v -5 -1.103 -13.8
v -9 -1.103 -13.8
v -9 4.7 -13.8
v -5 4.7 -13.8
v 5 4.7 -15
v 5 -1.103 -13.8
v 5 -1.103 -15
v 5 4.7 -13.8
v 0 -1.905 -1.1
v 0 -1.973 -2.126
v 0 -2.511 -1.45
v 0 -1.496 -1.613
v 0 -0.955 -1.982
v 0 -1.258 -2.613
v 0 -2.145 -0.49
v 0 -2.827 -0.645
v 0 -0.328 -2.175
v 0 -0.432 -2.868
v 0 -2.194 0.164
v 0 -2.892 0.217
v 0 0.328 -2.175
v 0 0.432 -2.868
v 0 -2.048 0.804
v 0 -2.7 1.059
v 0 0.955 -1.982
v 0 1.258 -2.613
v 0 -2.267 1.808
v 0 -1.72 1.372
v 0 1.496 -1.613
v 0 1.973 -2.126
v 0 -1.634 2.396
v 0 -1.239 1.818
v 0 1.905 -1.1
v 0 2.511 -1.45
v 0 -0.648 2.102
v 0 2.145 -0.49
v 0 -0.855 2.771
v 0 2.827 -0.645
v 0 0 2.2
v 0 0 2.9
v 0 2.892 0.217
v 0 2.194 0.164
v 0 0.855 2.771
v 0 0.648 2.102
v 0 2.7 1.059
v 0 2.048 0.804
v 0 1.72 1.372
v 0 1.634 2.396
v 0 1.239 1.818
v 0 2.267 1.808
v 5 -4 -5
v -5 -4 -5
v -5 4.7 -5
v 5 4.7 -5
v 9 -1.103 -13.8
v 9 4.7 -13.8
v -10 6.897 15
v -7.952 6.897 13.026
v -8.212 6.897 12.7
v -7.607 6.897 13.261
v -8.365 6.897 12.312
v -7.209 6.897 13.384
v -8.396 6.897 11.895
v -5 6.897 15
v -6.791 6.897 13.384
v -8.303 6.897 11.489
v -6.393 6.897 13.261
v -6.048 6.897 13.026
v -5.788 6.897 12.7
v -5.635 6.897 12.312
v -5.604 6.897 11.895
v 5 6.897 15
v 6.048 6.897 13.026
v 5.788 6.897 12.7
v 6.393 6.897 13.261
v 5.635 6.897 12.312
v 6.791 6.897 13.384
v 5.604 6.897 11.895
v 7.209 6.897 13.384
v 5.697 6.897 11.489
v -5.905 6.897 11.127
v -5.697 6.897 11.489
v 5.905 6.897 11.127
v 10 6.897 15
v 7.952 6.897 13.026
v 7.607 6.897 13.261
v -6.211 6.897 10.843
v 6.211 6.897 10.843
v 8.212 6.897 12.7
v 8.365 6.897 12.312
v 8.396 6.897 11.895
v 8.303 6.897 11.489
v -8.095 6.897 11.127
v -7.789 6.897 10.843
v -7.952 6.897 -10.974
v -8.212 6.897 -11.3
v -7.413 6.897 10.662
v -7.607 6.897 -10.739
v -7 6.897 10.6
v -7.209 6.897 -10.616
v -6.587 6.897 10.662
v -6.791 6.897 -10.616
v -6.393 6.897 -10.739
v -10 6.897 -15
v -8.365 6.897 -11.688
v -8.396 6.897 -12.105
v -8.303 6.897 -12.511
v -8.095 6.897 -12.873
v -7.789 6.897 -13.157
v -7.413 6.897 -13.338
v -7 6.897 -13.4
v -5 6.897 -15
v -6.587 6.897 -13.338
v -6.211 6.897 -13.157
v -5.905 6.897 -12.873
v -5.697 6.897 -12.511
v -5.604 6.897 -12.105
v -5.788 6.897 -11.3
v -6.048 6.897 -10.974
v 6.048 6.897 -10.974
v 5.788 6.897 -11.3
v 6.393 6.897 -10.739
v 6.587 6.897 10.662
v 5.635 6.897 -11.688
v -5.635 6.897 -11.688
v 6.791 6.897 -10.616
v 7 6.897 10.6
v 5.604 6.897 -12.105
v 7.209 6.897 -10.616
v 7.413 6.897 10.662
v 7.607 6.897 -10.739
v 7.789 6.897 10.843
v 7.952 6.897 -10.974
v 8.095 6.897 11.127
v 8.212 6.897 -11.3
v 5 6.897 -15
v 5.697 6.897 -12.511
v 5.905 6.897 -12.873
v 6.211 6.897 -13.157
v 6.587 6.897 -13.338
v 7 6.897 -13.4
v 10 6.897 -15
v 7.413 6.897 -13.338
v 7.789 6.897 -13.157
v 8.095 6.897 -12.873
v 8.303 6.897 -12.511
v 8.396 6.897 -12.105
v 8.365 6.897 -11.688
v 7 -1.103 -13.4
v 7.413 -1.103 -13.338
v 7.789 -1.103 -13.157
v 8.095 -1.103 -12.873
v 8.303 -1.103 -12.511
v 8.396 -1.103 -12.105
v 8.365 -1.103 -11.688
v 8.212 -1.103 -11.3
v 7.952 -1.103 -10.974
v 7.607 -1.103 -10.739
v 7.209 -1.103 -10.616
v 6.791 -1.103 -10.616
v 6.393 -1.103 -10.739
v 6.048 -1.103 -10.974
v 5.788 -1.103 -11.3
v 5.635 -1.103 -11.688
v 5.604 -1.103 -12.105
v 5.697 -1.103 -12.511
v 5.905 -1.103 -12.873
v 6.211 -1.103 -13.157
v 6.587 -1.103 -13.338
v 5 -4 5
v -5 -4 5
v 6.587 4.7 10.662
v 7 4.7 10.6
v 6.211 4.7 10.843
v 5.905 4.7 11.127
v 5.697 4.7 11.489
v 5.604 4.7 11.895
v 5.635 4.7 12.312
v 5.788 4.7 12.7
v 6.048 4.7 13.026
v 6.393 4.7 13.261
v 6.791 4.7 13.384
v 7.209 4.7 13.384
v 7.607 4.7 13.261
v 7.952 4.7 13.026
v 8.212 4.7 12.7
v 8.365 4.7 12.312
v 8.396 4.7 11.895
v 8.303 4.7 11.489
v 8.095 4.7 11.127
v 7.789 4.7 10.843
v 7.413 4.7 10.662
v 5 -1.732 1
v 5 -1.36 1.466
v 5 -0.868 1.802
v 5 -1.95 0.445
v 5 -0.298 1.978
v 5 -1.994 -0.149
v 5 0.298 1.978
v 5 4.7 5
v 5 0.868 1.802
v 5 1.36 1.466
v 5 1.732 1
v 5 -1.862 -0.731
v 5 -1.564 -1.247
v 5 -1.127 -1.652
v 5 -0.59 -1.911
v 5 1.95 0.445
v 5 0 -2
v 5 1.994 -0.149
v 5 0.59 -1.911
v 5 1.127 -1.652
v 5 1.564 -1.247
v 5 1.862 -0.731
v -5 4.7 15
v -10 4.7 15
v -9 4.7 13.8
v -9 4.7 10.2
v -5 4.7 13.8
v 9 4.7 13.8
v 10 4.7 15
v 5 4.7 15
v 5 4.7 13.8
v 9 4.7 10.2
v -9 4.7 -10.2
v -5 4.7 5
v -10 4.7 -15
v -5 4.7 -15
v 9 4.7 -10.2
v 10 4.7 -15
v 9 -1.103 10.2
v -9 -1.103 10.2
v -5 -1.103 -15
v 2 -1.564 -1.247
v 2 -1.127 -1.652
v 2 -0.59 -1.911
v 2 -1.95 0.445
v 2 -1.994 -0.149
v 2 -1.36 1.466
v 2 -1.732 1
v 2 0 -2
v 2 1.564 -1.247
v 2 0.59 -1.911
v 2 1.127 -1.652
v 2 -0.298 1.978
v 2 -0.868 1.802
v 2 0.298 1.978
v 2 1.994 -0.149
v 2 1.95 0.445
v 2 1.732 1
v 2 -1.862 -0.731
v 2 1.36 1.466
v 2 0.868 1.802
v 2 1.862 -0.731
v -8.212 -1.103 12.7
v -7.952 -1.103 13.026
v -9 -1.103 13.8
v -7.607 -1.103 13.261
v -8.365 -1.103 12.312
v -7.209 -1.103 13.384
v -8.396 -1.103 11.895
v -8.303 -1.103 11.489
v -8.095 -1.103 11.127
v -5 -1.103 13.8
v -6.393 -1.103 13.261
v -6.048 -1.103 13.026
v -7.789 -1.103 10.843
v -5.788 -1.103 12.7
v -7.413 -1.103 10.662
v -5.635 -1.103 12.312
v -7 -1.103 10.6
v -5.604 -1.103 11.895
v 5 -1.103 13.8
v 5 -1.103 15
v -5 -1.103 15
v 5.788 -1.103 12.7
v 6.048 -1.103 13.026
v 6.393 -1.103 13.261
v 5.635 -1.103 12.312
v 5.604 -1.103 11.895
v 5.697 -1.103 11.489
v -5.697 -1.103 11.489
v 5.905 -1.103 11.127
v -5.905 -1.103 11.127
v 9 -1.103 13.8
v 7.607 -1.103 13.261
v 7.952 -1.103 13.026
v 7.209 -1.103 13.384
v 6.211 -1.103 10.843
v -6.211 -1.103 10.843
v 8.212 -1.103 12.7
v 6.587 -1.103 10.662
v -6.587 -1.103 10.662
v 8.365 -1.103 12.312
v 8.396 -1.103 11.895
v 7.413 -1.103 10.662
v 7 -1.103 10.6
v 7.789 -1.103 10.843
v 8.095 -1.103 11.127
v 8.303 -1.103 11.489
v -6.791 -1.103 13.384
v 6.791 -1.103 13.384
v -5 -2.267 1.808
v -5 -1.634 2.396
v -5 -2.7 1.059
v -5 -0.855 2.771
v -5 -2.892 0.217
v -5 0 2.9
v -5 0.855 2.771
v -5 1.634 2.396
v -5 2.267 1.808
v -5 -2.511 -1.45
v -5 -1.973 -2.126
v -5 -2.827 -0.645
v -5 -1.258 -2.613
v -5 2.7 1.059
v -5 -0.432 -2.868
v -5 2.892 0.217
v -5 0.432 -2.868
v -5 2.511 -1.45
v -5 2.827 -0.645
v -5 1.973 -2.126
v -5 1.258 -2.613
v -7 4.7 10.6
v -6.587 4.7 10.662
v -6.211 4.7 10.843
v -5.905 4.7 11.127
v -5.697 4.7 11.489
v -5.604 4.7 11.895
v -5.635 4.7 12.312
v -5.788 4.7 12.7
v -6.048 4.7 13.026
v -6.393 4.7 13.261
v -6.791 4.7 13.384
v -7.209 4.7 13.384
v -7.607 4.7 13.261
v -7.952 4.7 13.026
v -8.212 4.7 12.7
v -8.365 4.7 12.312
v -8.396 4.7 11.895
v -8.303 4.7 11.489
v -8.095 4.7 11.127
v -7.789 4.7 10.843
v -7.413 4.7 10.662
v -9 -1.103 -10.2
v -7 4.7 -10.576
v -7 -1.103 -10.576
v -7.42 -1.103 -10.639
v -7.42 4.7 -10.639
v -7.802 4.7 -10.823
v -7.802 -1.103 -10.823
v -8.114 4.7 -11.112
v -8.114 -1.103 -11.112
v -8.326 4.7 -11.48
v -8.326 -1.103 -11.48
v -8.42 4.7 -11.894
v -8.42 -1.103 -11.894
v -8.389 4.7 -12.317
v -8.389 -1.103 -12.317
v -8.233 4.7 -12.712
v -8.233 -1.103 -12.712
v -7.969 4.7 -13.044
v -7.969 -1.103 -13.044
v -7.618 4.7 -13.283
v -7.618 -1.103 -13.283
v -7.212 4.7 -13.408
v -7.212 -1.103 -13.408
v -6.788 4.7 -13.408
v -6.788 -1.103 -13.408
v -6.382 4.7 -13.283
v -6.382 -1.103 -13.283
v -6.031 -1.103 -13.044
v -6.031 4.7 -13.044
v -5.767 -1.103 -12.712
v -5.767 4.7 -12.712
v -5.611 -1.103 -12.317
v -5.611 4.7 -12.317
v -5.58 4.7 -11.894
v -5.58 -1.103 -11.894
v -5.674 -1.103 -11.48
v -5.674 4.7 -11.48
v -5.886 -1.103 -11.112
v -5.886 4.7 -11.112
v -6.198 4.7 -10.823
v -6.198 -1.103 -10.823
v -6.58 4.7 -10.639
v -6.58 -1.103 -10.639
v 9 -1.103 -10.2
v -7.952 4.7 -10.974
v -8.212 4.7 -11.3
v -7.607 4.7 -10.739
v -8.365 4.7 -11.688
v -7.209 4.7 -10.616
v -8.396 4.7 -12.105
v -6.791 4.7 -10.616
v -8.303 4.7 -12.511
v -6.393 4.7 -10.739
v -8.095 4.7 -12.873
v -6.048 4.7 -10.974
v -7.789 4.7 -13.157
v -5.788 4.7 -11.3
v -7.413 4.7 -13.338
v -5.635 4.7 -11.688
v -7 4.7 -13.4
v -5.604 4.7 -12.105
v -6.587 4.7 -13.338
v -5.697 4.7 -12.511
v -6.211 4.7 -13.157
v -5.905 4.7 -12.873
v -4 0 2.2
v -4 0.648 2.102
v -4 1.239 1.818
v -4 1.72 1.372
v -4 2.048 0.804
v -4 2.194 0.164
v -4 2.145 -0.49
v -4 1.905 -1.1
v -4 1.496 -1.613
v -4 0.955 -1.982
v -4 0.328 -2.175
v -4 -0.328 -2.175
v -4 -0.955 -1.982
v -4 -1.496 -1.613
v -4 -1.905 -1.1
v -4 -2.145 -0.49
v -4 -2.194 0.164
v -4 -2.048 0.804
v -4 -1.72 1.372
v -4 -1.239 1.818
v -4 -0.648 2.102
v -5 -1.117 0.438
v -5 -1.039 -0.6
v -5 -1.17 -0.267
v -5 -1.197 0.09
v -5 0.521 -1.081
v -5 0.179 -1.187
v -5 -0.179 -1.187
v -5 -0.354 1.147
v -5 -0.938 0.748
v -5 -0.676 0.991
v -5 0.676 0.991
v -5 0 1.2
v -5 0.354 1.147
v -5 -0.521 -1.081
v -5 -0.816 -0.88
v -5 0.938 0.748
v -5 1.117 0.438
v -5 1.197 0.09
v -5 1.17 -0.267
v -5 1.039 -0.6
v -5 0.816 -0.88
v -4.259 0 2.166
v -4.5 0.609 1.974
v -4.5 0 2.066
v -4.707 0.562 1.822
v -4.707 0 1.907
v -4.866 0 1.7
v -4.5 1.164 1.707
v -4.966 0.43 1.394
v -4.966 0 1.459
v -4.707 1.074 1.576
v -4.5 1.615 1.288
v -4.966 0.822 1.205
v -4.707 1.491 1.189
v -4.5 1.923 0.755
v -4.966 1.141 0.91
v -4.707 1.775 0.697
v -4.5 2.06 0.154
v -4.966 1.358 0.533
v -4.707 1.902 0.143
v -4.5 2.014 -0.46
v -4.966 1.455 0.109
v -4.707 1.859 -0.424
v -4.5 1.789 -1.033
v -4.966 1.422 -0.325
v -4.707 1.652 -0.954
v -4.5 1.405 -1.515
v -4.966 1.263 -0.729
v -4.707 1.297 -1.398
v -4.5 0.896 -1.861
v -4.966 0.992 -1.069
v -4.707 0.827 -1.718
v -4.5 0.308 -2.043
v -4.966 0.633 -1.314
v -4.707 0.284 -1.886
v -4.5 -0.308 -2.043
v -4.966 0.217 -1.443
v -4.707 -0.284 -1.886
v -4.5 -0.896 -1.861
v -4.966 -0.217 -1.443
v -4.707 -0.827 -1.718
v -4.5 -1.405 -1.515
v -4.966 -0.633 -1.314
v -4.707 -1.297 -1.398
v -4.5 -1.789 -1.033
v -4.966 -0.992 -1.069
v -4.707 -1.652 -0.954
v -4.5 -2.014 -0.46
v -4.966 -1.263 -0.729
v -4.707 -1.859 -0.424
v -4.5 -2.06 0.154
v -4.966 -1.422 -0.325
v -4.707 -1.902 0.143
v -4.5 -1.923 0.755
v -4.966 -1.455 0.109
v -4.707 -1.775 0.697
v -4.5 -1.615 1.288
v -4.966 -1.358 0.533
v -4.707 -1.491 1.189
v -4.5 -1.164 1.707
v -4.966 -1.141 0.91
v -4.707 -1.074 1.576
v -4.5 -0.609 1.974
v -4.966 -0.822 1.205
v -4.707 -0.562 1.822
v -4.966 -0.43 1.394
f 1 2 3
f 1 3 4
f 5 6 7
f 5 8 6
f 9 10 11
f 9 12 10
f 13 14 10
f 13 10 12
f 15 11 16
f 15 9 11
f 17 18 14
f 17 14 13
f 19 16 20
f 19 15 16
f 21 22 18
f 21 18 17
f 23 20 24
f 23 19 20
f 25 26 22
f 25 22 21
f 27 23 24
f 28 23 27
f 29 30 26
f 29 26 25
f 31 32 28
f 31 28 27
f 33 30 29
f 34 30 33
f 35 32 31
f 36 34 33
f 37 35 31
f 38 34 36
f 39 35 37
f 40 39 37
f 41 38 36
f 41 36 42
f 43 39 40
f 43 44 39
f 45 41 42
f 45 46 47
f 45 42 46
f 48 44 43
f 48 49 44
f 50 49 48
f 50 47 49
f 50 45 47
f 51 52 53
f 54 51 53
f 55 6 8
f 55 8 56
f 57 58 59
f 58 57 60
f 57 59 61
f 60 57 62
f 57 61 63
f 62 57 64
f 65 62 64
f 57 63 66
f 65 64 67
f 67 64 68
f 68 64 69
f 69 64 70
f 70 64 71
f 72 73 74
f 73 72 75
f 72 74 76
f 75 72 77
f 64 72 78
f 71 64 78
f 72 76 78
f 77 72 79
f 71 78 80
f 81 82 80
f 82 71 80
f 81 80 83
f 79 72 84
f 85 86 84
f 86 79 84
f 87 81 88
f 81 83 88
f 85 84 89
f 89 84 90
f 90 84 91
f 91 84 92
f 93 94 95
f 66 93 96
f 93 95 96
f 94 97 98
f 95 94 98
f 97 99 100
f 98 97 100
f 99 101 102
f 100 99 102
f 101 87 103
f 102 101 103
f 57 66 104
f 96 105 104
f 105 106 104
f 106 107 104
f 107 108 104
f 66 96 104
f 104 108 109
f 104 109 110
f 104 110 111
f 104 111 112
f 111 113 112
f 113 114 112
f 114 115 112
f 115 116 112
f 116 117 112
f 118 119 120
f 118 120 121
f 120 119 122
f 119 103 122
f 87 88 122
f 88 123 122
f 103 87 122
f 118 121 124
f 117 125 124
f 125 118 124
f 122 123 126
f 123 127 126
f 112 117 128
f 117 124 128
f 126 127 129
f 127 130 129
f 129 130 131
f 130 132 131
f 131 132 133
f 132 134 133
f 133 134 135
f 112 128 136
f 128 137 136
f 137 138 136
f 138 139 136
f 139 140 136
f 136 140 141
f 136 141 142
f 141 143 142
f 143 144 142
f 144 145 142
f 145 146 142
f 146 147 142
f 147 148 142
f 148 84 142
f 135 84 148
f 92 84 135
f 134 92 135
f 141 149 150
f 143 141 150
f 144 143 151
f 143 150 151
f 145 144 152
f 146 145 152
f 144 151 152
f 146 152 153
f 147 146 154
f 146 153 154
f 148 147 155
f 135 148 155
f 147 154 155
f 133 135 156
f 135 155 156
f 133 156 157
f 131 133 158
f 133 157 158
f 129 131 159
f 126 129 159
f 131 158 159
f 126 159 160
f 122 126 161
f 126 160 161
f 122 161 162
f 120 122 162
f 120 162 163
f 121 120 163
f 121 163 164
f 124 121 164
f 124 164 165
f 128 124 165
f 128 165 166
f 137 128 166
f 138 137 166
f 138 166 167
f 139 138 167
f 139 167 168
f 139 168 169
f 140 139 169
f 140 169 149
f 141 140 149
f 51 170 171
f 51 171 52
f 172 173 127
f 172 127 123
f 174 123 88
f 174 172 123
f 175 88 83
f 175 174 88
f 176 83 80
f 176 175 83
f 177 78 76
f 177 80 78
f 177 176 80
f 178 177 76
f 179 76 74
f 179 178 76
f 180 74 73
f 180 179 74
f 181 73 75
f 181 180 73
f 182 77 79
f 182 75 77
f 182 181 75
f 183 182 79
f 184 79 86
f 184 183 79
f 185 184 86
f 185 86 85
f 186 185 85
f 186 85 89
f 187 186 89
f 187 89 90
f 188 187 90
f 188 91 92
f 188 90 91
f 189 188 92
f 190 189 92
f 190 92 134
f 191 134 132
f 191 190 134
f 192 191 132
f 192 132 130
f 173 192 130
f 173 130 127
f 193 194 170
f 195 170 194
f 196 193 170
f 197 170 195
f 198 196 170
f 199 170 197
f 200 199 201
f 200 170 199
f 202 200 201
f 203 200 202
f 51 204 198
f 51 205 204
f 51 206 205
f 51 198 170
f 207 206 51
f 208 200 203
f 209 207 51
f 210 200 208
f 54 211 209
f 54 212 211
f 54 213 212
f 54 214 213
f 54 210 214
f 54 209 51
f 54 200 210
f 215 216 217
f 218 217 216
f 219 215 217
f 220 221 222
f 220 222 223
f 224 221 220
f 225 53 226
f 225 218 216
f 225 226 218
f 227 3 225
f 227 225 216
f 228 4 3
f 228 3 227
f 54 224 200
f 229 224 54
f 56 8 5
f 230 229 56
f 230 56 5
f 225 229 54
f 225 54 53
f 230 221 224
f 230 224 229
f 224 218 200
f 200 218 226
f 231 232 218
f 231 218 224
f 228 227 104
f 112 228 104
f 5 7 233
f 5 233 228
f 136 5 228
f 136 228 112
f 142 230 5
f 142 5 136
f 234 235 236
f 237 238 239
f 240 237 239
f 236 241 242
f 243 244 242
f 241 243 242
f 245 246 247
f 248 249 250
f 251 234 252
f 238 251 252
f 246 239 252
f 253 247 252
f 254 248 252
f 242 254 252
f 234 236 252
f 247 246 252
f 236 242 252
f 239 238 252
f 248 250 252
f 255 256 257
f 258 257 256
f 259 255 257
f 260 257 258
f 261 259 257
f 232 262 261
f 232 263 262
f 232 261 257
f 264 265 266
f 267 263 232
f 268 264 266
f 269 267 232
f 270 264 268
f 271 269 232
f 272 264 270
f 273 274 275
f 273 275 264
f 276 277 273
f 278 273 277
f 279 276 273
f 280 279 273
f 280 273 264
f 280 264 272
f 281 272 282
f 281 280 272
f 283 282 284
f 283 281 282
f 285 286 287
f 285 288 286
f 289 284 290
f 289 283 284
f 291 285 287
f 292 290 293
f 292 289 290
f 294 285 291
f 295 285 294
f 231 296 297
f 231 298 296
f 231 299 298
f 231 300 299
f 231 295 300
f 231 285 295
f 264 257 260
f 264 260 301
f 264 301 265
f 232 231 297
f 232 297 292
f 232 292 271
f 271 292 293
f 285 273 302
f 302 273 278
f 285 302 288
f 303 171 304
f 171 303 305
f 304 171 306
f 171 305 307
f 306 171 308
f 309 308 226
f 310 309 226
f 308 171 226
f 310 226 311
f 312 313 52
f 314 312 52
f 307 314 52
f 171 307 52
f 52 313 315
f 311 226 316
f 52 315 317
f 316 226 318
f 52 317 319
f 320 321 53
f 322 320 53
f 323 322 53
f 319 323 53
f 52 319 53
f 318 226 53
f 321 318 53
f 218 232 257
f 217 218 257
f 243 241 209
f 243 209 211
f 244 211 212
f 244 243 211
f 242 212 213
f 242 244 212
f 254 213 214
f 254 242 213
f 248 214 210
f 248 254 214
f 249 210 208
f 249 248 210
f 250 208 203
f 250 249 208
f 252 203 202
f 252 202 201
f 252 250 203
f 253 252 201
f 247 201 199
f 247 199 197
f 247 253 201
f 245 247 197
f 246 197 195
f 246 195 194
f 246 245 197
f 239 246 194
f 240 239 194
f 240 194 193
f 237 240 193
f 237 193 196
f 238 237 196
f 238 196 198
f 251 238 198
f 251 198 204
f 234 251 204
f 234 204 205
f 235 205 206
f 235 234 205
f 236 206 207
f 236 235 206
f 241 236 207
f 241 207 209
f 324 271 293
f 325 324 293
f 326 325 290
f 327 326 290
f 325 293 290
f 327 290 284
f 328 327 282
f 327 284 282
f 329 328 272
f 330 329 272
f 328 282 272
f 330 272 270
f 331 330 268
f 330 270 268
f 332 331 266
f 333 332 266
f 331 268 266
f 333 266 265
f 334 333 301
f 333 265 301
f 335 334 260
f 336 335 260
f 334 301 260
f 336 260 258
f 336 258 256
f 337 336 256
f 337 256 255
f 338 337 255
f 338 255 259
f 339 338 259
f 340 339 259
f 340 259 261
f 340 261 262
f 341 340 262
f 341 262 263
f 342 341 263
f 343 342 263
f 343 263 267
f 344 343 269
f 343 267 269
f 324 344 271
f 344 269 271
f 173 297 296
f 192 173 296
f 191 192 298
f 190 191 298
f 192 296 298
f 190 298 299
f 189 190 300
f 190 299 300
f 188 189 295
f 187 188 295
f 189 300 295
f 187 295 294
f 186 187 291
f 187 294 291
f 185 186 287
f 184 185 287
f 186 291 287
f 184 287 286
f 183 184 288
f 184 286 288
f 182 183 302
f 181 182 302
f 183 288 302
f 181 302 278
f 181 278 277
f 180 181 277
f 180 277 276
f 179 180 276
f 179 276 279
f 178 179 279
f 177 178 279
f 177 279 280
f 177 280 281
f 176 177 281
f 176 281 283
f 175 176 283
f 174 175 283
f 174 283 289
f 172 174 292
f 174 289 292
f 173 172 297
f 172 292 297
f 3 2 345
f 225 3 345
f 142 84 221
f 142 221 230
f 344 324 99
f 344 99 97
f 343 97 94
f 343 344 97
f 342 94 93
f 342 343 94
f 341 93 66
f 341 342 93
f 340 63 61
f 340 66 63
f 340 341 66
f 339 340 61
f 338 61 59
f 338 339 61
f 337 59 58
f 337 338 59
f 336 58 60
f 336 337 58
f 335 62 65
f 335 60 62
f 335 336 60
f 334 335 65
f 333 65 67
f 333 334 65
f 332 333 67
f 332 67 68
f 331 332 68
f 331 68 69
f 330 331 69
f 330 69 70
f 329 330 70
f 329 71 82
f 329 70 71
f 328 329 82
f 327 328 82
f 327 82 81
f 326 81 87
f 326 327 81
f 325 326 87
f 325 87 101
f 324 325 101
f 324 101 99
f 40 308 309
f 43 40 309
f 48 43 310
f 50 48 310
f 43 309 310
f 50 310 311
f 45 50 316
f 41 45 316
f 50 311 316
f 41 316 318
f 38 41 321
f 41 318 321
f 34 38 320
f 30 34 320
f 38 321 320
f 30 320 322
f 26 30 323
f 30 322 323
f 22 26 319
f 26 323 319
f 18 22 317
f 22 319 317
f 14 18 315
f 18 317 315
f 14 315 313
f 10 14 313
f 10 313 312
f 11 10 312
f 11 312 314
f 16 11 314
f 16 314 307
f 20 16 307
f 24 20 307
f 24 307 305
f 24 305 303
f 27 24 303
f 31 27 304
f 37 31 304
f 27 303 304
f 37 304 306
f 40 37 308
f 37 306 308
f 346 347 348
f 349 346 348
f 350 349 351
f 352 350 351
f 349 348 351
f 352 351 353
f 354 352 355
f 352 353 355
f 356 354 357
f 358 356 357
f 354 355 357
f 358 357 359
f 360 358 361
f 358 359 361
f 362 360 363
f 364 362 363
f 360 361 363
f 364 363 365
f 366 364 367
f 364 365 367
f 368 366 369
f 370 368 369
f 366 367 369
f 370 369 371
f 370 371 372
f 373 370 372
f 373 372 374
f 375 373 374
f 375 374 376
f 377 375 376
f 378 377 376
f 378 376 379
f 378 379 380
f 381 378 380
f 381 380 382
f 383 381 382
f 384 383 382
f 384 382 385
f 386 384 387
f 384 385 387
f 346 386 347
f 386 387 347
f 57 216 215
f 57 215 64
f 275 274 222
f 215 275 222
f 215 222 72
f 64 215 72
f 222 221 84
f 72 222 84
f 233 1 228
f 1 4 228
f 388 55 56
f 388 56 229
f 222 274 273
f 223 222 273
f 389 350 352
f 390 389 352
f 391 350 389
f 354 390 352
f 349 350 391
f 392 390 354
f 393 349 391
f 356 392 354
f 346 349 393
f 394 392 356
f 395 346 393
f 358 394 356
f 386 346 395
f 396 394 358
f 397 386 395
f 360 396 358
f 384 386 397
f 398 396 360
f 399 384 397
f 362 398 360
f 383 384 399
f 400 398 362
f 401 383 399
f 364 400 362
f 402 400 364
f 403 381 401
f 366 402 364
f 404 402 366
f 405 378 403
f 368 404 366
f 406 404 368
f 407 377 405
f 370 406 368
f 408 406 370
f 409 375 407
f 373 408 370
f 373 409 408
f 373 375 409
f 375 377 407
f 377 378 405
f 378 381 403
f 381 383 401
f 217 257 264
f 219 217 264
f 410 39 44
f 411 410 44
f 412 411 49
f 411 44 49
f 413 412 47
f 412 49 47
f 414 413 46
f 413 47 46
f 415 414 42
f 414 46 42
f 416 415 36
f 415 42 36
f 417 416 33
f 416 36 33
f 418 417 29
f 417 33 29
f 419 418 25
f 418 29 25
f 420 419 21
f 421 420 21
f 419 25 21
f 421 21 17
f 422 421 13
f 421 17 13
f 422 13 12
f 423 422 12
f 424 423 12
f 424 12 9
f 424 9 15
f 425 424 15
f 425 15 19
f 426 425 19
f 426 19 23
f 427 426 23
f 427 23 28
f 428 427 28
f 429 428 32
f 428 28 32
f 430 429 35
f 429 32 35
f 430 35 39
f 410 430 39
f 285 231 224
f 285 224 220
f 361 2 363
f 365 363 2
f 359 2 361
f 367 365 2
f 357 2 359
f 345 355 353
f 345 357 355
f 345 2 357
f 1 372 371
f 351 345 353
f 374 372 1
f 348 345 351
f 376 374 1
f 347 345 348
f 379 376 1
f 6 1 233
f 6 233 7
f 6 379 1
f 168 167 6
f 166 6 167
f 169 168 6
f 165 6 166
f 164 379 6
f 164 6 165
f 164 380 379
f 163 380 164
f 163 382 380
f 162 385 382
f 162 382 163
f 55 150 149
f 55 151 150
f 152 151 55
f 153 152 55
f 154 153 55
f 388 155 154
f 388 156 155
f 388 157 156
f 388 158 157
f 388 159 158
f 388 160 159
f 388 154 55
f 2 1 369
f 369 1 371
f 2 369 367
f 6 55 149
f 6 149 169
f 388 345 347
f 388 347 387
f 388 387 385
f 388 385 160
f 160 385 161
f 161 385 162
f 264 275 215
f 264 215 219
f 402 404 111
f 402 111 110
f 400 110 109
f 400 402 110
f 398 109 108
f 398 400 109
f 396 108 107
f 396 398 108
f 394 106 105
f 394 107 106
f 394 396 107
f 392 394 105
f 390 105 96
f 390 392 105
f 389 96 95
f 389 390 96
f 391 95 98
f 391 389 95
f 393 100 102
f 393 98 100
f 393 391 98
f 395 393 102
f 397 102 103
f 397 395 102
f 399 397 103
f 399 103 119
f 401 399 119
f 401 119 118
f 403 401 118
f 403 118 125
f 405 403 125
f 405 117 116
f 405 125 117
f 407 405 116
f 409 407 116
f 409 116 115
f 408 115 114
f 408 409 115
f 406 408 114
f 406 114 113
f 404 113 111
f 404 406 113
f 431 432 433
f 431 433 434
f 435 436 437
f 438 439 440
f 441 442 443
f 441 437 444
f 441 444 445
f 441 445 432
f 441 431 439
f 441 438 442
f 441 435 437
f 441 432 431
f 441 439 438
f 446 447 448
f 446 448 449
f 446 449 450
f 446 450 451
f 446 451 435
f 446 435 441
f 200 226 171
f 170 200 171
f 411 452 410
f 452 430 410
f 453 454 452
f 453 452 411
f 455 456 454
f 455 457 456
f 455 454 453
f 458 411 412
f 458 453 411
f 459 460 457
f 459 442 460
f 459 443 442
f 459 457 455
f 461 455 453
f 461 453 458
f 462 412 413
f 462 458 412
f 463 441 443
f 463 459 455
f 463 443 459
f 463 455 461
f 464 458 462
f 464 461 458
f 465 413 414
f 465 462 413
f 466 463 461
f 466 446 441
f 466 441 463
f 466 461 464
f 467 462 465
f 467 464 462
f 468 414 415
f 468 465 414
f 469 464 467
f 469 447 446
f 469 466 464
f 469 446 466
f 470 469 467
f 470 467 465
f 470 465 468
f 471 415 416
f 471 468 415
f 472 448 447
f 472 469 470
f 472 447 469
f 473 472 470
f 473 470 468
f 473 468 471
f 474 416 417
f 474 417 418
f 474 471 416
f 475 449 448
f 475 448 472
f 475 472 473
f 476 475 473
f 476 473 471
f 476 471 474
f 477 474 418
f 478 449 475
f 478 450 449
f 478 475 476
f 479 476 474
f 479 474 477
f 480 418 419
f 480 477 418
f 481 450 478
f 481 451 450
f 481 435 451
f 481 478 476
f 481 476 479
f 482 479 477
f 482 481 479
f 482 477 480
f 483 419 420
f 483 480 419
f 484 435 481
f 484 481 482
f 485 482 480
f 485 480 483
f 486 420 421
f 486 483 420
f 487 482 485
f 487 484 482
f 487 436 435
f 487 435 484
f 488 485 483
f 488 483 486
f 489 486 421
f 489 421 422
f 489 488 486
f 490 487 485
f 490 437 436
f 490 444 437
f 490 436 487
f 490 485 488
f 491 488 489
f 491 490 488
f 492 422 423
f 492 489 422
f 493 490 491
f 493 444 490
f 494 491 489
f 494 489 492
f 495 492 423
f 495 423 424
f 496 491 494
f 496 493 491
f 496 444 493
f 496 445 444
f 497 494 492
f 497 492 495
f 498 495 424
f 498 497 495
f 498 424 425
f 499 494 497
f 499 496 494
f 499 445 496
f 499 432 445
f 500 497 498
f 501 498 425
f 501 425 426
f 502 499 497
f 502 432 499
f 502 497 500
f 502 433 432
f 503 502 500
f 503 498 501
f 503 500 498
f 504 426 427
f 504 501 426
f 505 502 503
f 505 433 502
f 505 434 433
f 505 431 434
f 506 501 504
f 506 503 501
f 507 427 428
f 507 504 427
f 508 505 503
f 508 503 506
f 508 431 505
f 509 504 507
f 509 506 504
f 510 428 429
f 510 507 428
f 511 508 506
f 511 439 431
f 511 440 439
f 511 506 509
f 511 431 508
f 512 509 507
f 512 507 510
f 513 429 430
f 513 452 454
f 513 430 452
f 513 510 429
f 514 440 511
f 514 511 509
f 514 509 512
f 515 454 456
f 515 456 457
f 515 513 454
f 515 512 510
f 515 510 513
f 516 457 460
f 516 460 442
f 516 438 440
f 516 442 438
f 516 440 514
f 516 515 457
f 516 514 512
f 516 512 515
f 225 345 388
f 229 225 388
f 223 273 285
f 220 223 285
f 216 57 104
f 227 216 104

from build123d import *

# Parameters (mm, degrees)
SKETCH_1_R          = 2
EXTRUDE_1_DEPTH     = 5
SKETCH_3_W          = 30
SKETCH_3_H          = 2.196813629
EXTRUDE_2_DEPTH     = 10
SKETCH_4_R          = 1.4
CUT_EXTRUDE_2_DEPTH = 20
EXTRUDE_START       = 5.803186371
SKETCH_5_W          = 4
SKETCH_5_H          = 3.6
SKETCH_5_R          = 1.424260765
SKETCH_5_R_2        = 1.4
EXTRUDE_3_DEPTH     = 5.803186371
SKETCH_6_W          = 5.555026764
SKETCH_6_H          = 4.966415056
EXTRUDE_4_DEPTH     = 7
SKETCH_8_R          = 2.9
CUT_EXTRUDE_3_DEPTH = 5
SKETCH_9_R          = 2.2
EXTRUDE_5_DEPTH     = 5
FILLET_1_R          = 1


with BuildPart() as part:
    # 스케치1 → 보스-돌출1 (new, symmetric)
    with BuildSketch(Plane(origin=(0, 0, 0), x_dir=(0, 0, -1), z_dir=(1, 0, 0))):
        Polygon((15, 6.896813629), (-15, 6.896813629), (-15, -1.103186371), (-10.2, -1.103186371), (-10.2, 4.7), (-5, 4.7), (-5, -4), (5, -4), (5, 4.7), (10.2, 4.7), (10.2, -1.103186371), (15, -1.103186371), align=None)
        Circle(SKETCH_1_R, mode=Mode.SUBTRACT)
    extrude(amount=EXTRUDE_1_DEPTH, both=True)

    # 스케치3 → 보스-돌출2 (add, symmetric)
    with BuildSketch(Plane(origin=(0, 0, 0), x_dir=(0, 0, -1), z_dir=(1, 0, 0))):
        with Locations((0, 5.798406814)):
            Rectangle(SKETCH_3_W, SKETCH_3_H)
    extrude(amount=EXTRUDE_2_DEPTH, both=True)

    # 스케치4 → 컷-돌출2 (cut)
    with BuildSketch(Plane(origin=(0, 0, 0), x_dir=(1, 0, 0), z_dir=(0, 1, 0))):
        with Locations(Location((-7, -12, 0), (0, 0, 90))):
            Circle(SKETCH_4_R)
        with Locations(Location((7, -12, 0), (0, 0, 90))):
            Circle(SKETCH_4_R)
        with Locations(Location((7, 12, 0), (0, 0, 90))):
            Circle(SKETCH_4_R)
        with Locations(Location((-7, 12, 0), (0, 0, 90))):
            Circle(SKETCH_4_R)
    extrude(amount=CUT_EXTRUDE_2_DEPTH, mode=Mode.SUBTRACT)

    # 스케치5 → 보스-돌출3 (add)
    # profile 1 of 4: a face of its own
    with BuildSketch(Plane.XZ.offset(-4.7).offset(EXTRUDE_START)):
        with Locations((-7, -12)):
            Rectangle(SKETCH_5_W, SKETCH_5_H)
        with Locations(Location((-7, -12, 0), (0, 0, 90))):
            Circle(SKETCH_5_R, mode=Mode.SUBTRACT)
    # profile 2 of 4: a face of its own
    with BuildSketch(Plane.XZ.offset(-4.7).offset(EXTRUDE_START)):
        with Locations((7, -12)):
            Rectangle(SKETCH_5_W, SKETCH_5_H)
        with Locations(Location((7, -12, 0), (0, 0, 270))):
            Circle(SKETCH_5_R_2, mode=Mode.SUBTRACT)
    # profile 3 of 4: a face of its own
    with BuildSketch(Plane.XZ.offset(-4.7).offset(EXTRUDE_START)):
        with Locations((7, 12)):
            Rectangle(SKETCH_5_W, SKETCH_5_H)
        with Locations(Location((7, 12, 0), (0, 0, 270))):
            Circle(SKETCH_5_R_2, mode=Mode.SUBTRACT)
    # profile 4 of 4: a face of its own
    with BuildSketch(Plane.XZ.offset(-4.7).offset(EXTRUDE_START)):
        with Locations((-7, 12)):
            Rectangle(SKETCH_5_W, SKETCH_5_H)
        with Locations(Location((-7, 12, 0), (0, 0, 270))):
            Circle(SKETCH_5_R_2, mode=Mode.SUBTRACT)
    extrude(amount=-EXTRUDE_3_DEPTH)

    # 스케치6 → 보스-돌출4 (add)
    with BuildSketch(Plane.ZY.offset(5)):
        Rectangle(SKETCH_6_W, SKETCH_6_H)
    extrude(amount=-EXTRUDE_4_DEPTH)

    # 스케치8 → 컷-돌출3 (cut)
    with BuildSketch(Plane.ZY.offset(5)):
        Circle(SKETCH_8_R)
    extrude(amount=-CUT_EXTRUDE_3_DEPTH, mode=Mode.SUBTRACT)

    # 스케치9 → 보스-돌출5 (add)
    with BuildSketch(Plane.ZY):
        Circle(SKETCH_9_R)
    extrude(amount=EXTRUDE_5_DEPTH)

    # 필렛1
    fillet_1_edges = [part.edges().sort_by_distance(p)[0] for p in [
        (-5, 0, -2.2),
    ]]
    fillet(fillet_1_edges, radius=FILLET_1_R)


solid = part.part
